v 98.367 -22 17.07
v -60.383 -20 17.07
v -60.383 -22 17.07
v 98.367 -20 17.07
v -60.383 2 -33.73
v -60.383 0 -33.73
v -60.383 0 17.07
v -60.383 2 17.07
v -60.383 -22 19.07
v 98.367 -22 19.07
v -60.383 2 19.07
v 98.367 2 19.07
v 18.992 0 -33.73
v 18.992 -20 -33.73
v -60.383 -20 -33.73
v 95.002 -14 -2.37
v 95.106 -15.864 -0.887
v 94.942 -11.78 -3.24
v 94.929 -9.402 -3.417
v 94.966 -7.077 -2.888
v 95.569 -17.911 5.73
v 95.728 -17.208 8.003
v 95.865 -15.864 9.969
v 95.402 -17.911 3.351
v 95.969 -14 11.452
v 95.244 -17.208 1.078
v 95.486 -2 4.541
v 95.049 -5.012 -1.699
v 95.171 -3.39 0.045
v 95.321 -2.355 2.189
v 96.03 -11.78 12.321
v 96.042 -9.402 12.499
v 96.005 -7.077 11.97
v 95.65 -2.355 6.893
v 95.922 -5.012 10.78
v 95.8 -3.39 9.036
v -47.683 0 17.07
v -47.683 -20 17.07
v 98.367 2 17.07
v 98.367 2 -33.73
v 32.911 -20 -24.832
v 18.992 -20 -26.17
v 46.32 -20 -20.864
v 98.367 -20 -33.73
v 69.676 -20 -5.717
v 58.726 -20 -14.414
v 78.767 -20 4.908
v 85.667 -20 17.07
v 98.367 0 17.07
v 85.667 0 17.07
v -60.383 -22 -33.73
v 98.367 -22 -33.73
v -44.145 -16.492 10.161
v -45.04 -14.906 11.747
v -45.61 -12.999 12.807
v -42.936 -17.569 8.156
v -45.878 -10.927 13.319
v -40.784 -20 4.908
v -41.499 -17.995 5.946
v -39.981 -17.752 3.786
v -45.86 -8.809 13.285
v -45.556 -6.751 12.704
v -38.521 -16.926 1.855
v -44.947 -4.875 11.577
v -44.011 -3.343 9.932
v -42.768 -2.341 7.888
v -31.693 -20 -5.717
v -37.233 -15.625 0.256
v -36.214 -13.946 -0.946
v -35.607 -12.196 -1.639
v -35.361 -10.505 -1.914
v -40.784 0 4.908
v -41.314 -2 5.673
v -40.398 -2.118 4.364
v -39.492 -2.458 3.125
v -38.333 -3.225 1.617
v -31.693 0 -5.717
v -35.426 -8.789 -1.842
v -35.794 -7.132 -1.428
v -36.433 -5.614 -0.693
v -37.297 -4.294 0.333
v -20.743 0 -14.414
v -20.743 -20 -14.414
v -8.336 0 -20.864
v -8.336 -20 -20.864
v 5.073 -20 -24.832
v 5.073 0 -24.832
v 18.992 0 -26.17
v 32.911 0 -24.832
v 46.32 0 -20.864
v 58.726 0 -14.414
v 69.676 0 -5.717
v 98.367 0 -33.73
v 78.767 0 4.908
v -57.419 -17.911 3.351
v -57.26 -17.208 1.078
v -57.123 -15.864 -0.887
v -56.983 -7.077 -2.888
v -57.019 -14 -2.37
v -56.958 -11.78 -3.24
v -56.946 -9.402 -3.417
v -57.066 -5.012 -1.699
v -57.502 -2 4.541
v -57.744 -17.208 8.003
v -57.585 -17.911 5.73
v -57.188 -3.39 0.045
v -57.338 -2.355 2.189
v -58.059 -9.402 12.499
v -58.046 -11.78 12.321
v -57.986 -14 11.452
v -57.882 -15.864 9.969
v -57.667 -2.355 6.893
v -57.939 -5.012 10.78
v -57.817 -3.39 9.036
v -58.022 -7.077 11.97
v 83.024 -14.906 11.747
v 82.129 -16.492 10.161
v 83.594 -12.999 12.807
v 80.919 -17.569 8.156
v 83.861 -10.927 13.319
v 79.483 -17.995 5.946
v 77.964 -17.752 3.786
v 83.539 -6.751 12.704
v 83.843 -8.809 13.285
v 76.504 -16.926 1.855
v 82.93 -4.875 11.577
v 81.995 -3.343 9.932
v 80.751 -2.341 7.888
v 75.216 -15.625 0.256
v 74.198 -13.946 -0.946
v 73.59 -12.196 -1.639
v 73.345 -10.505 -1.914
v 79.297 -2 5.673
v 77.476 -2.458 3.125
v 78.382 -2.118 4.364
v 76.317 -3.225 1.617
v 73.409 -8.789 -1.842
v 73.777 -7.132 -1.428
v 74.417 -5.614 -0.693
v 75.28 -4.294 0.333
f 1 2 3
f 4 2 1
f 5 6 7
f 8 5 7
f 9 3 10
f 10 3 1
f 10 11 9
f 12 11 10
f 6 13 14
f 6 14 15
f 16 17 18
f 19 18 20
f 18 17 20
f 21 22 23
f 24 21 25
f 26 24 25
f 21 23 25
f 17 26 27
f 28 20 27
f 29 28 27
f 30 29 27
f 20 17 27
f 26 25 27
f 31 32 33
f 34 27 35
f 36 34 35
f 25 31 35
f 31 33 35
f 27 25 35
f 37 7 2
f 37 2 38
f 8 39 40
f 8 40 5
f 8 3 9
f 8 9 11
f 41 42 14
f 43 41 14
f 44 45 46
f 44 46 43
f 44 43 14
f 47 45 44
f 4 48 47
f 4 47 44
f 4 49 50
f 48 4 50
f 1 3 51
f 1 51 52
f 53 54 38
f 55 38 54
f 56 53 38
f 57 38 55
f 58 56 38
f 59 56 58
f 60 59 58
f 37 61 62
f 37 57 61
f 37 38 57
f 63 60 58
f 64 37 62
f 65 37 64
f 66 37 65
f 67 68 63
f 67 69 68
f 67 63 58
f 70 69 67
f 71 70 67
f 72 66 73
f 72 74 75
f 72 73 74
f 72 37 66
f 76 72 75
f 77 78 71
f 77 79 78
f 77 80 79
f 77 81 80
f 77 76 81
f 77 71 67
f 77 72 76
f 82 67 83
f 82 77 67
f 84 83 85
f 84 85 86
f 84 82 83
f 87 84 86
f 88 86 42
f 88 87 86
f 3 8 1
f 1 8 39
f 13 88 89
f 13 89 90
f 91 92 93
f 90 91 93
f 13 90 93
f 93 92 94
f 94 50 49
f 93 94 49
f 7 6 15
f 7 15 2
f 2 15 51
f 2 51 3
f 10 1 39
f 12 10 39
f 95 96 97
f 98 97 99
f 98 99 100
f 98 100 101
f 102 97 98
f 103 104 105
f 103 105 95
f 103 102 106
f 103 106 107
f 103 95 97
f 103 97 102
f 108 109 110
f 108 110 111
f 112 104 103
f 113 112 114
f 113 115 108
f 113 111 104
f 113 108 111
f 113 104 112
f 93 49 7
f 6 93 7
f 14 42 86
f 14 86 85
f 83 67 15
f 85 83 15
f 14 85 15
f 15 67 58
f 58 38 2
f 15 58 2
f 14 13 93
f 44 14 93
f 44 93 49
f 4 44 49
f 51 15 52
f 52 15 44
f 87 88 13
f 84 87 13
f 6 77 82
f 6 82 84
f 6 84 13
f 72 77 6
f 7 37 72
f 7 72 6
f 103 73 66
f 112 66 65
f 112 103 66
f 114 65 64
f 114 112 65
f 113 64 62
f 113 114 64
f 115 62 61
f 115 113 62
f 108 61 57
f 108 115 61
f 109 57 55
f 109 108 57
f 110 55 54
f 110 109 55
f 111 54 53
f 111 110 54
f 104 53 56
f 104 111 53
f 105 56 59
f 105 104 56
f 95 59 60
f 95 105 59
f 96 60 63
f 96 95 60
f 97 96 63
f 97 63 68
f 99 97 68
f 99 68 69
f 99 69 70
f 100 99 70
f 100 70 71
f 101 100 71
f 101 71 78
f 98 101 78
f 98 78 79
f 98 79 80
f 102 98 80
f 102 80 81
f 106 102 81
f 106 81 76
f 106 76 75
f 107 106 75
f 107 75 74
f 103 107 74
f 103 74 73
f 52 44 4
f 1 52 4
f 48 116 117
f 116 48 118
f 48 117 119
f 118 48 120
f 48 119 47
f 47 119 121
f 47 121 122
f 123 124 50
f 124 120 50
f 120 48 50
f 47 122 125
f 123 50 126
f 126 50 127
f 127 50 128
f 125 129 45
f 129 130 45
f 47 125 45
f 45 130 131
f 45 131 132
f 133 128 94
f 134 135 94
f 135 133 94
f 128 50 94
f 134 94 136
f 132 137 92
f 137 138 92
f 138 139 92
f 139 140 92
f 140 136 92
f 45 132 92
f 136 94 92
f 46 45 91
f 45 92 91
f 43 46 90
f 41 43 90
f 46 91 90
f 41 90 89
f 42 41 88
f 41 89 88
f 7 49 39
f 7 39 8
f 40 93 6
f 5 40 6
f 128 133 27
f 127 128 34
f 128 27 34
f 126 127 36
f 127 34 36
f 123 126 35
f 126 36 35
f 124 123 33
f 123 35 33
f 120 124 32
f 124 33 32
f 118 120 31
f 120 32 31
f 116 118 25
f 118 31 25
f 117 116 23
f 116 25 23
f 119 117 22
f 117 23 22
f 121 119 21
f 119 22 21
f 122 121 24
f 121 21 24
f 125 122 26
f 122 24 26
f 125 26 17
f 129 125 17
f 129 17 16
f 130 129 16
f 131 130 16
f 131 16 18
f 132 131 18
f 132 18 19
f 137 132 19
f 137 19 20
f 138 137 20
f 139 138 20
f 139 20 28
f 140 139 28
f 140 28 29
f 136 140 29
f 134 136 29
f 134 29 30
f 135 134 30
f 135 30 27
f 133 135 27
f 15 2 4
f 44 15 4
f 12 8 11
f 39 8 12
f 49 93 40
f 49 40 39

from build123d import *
from build123d import SkipClean  # not in build123d's __all__

# Parameters (mm, degrees)
F1_DEPTH  = 20
F5_R      = 8
F6_DEPTH  = 21.6502592253
F8_W      = 158.75
F8_H      = 50.8
F9_DEPTH  = 2
F10_W     = 158.75
F10_H     = 50.8
F11_DEPTH = 2
F12_W     = 158.75
F12_H     = 24
F13_DEPTH = 2


# Not quite as in the source:
# - a feature names something its author has since deleted; it is built from what else it names


with BuildPart() as f1:
    # F0 (on Front) → F1 (new body)
    with BuildSketch(Plane.XZ):
        with BuildLine():
            Line((18.991692129, -26.1704544329), (18.991692129, -33.7295945078))
            Line((18.991692129, -33.7295945078), (98.366692129, -33.7295945078))
            Line((98.366692129, -33.7295945078), (98.366692129, 17.0704054922))
            Line((98.366692129, 17.0704054922), (85.666692129, 17.0704054922))
            ThreePointArc((85.666692129, 17.0704054922), (58.7262098437, -14.413869844), (18.991692129, -26.1704544329))
        make_face()
    extrude(amount=F1_DEPTH)

    # F5 (on face) → F6 (cut, through all)
    with BuildSketch(Plane(origin=(94.705044452, 0, -6.6224218335), x_dir=(0, 1, 0), z_dir=(0.9975640503, 0, -0.0697564737))):
        with Locations((-10, 11.1905364192)):
            Circle(F5_R)
    extrude(amount=-F6_DEPTH, mode=Mode.SUBTRACT)

    # F7: F1 across face


with BuildPart() as f1_1:
    add(f1.part, clean=False)
    with SkipClean():  # cleaning this boolean's faces spoils the solid; the shape is the same uncleaned
        add(f1.part.mirror(Plane(origin=(18.991692129, -10, -29.9500244704), x_dir=(0, -1, 0), z_dir=(-1, 0, 0))), clean=False)


with BuildPart() as f9:
    # F8 (on face) → F9 (new body)
    with BuildSketch(Plane(origin=(0, 0, 0), x_dir=(-1, 0, 0), z_dir=(0, 1, 0))):
        with Locations((-18.991692129, -8.3295945078)):
            Rectangle(F8_W, F8_H)
    extrude(amount=F9_DEPTH)


with BuildPart() as f11:
    # F10 (on face) → F11 (new body)
    with BuildSketch(Plane.XZ.offset(20)):
        with Locations((18.991692129, -8.3295945078)):
            Rectangle(F10_W, F10_H)
    extrude(amount=F11_DEPTH)


with BuildPart() as f13:
    # F12 (on face) → F13 (new body)
    with BuildSketch(Plane.XY.offset(17.0704054922)):
        with Locations((18.991692129, -10)):
            Rectangle(F12_W, F12_H)
    extrude(amount=F13_DEPTH)


solid = Compound([f1_1.part, f9.part, f11.part, f13.part])
